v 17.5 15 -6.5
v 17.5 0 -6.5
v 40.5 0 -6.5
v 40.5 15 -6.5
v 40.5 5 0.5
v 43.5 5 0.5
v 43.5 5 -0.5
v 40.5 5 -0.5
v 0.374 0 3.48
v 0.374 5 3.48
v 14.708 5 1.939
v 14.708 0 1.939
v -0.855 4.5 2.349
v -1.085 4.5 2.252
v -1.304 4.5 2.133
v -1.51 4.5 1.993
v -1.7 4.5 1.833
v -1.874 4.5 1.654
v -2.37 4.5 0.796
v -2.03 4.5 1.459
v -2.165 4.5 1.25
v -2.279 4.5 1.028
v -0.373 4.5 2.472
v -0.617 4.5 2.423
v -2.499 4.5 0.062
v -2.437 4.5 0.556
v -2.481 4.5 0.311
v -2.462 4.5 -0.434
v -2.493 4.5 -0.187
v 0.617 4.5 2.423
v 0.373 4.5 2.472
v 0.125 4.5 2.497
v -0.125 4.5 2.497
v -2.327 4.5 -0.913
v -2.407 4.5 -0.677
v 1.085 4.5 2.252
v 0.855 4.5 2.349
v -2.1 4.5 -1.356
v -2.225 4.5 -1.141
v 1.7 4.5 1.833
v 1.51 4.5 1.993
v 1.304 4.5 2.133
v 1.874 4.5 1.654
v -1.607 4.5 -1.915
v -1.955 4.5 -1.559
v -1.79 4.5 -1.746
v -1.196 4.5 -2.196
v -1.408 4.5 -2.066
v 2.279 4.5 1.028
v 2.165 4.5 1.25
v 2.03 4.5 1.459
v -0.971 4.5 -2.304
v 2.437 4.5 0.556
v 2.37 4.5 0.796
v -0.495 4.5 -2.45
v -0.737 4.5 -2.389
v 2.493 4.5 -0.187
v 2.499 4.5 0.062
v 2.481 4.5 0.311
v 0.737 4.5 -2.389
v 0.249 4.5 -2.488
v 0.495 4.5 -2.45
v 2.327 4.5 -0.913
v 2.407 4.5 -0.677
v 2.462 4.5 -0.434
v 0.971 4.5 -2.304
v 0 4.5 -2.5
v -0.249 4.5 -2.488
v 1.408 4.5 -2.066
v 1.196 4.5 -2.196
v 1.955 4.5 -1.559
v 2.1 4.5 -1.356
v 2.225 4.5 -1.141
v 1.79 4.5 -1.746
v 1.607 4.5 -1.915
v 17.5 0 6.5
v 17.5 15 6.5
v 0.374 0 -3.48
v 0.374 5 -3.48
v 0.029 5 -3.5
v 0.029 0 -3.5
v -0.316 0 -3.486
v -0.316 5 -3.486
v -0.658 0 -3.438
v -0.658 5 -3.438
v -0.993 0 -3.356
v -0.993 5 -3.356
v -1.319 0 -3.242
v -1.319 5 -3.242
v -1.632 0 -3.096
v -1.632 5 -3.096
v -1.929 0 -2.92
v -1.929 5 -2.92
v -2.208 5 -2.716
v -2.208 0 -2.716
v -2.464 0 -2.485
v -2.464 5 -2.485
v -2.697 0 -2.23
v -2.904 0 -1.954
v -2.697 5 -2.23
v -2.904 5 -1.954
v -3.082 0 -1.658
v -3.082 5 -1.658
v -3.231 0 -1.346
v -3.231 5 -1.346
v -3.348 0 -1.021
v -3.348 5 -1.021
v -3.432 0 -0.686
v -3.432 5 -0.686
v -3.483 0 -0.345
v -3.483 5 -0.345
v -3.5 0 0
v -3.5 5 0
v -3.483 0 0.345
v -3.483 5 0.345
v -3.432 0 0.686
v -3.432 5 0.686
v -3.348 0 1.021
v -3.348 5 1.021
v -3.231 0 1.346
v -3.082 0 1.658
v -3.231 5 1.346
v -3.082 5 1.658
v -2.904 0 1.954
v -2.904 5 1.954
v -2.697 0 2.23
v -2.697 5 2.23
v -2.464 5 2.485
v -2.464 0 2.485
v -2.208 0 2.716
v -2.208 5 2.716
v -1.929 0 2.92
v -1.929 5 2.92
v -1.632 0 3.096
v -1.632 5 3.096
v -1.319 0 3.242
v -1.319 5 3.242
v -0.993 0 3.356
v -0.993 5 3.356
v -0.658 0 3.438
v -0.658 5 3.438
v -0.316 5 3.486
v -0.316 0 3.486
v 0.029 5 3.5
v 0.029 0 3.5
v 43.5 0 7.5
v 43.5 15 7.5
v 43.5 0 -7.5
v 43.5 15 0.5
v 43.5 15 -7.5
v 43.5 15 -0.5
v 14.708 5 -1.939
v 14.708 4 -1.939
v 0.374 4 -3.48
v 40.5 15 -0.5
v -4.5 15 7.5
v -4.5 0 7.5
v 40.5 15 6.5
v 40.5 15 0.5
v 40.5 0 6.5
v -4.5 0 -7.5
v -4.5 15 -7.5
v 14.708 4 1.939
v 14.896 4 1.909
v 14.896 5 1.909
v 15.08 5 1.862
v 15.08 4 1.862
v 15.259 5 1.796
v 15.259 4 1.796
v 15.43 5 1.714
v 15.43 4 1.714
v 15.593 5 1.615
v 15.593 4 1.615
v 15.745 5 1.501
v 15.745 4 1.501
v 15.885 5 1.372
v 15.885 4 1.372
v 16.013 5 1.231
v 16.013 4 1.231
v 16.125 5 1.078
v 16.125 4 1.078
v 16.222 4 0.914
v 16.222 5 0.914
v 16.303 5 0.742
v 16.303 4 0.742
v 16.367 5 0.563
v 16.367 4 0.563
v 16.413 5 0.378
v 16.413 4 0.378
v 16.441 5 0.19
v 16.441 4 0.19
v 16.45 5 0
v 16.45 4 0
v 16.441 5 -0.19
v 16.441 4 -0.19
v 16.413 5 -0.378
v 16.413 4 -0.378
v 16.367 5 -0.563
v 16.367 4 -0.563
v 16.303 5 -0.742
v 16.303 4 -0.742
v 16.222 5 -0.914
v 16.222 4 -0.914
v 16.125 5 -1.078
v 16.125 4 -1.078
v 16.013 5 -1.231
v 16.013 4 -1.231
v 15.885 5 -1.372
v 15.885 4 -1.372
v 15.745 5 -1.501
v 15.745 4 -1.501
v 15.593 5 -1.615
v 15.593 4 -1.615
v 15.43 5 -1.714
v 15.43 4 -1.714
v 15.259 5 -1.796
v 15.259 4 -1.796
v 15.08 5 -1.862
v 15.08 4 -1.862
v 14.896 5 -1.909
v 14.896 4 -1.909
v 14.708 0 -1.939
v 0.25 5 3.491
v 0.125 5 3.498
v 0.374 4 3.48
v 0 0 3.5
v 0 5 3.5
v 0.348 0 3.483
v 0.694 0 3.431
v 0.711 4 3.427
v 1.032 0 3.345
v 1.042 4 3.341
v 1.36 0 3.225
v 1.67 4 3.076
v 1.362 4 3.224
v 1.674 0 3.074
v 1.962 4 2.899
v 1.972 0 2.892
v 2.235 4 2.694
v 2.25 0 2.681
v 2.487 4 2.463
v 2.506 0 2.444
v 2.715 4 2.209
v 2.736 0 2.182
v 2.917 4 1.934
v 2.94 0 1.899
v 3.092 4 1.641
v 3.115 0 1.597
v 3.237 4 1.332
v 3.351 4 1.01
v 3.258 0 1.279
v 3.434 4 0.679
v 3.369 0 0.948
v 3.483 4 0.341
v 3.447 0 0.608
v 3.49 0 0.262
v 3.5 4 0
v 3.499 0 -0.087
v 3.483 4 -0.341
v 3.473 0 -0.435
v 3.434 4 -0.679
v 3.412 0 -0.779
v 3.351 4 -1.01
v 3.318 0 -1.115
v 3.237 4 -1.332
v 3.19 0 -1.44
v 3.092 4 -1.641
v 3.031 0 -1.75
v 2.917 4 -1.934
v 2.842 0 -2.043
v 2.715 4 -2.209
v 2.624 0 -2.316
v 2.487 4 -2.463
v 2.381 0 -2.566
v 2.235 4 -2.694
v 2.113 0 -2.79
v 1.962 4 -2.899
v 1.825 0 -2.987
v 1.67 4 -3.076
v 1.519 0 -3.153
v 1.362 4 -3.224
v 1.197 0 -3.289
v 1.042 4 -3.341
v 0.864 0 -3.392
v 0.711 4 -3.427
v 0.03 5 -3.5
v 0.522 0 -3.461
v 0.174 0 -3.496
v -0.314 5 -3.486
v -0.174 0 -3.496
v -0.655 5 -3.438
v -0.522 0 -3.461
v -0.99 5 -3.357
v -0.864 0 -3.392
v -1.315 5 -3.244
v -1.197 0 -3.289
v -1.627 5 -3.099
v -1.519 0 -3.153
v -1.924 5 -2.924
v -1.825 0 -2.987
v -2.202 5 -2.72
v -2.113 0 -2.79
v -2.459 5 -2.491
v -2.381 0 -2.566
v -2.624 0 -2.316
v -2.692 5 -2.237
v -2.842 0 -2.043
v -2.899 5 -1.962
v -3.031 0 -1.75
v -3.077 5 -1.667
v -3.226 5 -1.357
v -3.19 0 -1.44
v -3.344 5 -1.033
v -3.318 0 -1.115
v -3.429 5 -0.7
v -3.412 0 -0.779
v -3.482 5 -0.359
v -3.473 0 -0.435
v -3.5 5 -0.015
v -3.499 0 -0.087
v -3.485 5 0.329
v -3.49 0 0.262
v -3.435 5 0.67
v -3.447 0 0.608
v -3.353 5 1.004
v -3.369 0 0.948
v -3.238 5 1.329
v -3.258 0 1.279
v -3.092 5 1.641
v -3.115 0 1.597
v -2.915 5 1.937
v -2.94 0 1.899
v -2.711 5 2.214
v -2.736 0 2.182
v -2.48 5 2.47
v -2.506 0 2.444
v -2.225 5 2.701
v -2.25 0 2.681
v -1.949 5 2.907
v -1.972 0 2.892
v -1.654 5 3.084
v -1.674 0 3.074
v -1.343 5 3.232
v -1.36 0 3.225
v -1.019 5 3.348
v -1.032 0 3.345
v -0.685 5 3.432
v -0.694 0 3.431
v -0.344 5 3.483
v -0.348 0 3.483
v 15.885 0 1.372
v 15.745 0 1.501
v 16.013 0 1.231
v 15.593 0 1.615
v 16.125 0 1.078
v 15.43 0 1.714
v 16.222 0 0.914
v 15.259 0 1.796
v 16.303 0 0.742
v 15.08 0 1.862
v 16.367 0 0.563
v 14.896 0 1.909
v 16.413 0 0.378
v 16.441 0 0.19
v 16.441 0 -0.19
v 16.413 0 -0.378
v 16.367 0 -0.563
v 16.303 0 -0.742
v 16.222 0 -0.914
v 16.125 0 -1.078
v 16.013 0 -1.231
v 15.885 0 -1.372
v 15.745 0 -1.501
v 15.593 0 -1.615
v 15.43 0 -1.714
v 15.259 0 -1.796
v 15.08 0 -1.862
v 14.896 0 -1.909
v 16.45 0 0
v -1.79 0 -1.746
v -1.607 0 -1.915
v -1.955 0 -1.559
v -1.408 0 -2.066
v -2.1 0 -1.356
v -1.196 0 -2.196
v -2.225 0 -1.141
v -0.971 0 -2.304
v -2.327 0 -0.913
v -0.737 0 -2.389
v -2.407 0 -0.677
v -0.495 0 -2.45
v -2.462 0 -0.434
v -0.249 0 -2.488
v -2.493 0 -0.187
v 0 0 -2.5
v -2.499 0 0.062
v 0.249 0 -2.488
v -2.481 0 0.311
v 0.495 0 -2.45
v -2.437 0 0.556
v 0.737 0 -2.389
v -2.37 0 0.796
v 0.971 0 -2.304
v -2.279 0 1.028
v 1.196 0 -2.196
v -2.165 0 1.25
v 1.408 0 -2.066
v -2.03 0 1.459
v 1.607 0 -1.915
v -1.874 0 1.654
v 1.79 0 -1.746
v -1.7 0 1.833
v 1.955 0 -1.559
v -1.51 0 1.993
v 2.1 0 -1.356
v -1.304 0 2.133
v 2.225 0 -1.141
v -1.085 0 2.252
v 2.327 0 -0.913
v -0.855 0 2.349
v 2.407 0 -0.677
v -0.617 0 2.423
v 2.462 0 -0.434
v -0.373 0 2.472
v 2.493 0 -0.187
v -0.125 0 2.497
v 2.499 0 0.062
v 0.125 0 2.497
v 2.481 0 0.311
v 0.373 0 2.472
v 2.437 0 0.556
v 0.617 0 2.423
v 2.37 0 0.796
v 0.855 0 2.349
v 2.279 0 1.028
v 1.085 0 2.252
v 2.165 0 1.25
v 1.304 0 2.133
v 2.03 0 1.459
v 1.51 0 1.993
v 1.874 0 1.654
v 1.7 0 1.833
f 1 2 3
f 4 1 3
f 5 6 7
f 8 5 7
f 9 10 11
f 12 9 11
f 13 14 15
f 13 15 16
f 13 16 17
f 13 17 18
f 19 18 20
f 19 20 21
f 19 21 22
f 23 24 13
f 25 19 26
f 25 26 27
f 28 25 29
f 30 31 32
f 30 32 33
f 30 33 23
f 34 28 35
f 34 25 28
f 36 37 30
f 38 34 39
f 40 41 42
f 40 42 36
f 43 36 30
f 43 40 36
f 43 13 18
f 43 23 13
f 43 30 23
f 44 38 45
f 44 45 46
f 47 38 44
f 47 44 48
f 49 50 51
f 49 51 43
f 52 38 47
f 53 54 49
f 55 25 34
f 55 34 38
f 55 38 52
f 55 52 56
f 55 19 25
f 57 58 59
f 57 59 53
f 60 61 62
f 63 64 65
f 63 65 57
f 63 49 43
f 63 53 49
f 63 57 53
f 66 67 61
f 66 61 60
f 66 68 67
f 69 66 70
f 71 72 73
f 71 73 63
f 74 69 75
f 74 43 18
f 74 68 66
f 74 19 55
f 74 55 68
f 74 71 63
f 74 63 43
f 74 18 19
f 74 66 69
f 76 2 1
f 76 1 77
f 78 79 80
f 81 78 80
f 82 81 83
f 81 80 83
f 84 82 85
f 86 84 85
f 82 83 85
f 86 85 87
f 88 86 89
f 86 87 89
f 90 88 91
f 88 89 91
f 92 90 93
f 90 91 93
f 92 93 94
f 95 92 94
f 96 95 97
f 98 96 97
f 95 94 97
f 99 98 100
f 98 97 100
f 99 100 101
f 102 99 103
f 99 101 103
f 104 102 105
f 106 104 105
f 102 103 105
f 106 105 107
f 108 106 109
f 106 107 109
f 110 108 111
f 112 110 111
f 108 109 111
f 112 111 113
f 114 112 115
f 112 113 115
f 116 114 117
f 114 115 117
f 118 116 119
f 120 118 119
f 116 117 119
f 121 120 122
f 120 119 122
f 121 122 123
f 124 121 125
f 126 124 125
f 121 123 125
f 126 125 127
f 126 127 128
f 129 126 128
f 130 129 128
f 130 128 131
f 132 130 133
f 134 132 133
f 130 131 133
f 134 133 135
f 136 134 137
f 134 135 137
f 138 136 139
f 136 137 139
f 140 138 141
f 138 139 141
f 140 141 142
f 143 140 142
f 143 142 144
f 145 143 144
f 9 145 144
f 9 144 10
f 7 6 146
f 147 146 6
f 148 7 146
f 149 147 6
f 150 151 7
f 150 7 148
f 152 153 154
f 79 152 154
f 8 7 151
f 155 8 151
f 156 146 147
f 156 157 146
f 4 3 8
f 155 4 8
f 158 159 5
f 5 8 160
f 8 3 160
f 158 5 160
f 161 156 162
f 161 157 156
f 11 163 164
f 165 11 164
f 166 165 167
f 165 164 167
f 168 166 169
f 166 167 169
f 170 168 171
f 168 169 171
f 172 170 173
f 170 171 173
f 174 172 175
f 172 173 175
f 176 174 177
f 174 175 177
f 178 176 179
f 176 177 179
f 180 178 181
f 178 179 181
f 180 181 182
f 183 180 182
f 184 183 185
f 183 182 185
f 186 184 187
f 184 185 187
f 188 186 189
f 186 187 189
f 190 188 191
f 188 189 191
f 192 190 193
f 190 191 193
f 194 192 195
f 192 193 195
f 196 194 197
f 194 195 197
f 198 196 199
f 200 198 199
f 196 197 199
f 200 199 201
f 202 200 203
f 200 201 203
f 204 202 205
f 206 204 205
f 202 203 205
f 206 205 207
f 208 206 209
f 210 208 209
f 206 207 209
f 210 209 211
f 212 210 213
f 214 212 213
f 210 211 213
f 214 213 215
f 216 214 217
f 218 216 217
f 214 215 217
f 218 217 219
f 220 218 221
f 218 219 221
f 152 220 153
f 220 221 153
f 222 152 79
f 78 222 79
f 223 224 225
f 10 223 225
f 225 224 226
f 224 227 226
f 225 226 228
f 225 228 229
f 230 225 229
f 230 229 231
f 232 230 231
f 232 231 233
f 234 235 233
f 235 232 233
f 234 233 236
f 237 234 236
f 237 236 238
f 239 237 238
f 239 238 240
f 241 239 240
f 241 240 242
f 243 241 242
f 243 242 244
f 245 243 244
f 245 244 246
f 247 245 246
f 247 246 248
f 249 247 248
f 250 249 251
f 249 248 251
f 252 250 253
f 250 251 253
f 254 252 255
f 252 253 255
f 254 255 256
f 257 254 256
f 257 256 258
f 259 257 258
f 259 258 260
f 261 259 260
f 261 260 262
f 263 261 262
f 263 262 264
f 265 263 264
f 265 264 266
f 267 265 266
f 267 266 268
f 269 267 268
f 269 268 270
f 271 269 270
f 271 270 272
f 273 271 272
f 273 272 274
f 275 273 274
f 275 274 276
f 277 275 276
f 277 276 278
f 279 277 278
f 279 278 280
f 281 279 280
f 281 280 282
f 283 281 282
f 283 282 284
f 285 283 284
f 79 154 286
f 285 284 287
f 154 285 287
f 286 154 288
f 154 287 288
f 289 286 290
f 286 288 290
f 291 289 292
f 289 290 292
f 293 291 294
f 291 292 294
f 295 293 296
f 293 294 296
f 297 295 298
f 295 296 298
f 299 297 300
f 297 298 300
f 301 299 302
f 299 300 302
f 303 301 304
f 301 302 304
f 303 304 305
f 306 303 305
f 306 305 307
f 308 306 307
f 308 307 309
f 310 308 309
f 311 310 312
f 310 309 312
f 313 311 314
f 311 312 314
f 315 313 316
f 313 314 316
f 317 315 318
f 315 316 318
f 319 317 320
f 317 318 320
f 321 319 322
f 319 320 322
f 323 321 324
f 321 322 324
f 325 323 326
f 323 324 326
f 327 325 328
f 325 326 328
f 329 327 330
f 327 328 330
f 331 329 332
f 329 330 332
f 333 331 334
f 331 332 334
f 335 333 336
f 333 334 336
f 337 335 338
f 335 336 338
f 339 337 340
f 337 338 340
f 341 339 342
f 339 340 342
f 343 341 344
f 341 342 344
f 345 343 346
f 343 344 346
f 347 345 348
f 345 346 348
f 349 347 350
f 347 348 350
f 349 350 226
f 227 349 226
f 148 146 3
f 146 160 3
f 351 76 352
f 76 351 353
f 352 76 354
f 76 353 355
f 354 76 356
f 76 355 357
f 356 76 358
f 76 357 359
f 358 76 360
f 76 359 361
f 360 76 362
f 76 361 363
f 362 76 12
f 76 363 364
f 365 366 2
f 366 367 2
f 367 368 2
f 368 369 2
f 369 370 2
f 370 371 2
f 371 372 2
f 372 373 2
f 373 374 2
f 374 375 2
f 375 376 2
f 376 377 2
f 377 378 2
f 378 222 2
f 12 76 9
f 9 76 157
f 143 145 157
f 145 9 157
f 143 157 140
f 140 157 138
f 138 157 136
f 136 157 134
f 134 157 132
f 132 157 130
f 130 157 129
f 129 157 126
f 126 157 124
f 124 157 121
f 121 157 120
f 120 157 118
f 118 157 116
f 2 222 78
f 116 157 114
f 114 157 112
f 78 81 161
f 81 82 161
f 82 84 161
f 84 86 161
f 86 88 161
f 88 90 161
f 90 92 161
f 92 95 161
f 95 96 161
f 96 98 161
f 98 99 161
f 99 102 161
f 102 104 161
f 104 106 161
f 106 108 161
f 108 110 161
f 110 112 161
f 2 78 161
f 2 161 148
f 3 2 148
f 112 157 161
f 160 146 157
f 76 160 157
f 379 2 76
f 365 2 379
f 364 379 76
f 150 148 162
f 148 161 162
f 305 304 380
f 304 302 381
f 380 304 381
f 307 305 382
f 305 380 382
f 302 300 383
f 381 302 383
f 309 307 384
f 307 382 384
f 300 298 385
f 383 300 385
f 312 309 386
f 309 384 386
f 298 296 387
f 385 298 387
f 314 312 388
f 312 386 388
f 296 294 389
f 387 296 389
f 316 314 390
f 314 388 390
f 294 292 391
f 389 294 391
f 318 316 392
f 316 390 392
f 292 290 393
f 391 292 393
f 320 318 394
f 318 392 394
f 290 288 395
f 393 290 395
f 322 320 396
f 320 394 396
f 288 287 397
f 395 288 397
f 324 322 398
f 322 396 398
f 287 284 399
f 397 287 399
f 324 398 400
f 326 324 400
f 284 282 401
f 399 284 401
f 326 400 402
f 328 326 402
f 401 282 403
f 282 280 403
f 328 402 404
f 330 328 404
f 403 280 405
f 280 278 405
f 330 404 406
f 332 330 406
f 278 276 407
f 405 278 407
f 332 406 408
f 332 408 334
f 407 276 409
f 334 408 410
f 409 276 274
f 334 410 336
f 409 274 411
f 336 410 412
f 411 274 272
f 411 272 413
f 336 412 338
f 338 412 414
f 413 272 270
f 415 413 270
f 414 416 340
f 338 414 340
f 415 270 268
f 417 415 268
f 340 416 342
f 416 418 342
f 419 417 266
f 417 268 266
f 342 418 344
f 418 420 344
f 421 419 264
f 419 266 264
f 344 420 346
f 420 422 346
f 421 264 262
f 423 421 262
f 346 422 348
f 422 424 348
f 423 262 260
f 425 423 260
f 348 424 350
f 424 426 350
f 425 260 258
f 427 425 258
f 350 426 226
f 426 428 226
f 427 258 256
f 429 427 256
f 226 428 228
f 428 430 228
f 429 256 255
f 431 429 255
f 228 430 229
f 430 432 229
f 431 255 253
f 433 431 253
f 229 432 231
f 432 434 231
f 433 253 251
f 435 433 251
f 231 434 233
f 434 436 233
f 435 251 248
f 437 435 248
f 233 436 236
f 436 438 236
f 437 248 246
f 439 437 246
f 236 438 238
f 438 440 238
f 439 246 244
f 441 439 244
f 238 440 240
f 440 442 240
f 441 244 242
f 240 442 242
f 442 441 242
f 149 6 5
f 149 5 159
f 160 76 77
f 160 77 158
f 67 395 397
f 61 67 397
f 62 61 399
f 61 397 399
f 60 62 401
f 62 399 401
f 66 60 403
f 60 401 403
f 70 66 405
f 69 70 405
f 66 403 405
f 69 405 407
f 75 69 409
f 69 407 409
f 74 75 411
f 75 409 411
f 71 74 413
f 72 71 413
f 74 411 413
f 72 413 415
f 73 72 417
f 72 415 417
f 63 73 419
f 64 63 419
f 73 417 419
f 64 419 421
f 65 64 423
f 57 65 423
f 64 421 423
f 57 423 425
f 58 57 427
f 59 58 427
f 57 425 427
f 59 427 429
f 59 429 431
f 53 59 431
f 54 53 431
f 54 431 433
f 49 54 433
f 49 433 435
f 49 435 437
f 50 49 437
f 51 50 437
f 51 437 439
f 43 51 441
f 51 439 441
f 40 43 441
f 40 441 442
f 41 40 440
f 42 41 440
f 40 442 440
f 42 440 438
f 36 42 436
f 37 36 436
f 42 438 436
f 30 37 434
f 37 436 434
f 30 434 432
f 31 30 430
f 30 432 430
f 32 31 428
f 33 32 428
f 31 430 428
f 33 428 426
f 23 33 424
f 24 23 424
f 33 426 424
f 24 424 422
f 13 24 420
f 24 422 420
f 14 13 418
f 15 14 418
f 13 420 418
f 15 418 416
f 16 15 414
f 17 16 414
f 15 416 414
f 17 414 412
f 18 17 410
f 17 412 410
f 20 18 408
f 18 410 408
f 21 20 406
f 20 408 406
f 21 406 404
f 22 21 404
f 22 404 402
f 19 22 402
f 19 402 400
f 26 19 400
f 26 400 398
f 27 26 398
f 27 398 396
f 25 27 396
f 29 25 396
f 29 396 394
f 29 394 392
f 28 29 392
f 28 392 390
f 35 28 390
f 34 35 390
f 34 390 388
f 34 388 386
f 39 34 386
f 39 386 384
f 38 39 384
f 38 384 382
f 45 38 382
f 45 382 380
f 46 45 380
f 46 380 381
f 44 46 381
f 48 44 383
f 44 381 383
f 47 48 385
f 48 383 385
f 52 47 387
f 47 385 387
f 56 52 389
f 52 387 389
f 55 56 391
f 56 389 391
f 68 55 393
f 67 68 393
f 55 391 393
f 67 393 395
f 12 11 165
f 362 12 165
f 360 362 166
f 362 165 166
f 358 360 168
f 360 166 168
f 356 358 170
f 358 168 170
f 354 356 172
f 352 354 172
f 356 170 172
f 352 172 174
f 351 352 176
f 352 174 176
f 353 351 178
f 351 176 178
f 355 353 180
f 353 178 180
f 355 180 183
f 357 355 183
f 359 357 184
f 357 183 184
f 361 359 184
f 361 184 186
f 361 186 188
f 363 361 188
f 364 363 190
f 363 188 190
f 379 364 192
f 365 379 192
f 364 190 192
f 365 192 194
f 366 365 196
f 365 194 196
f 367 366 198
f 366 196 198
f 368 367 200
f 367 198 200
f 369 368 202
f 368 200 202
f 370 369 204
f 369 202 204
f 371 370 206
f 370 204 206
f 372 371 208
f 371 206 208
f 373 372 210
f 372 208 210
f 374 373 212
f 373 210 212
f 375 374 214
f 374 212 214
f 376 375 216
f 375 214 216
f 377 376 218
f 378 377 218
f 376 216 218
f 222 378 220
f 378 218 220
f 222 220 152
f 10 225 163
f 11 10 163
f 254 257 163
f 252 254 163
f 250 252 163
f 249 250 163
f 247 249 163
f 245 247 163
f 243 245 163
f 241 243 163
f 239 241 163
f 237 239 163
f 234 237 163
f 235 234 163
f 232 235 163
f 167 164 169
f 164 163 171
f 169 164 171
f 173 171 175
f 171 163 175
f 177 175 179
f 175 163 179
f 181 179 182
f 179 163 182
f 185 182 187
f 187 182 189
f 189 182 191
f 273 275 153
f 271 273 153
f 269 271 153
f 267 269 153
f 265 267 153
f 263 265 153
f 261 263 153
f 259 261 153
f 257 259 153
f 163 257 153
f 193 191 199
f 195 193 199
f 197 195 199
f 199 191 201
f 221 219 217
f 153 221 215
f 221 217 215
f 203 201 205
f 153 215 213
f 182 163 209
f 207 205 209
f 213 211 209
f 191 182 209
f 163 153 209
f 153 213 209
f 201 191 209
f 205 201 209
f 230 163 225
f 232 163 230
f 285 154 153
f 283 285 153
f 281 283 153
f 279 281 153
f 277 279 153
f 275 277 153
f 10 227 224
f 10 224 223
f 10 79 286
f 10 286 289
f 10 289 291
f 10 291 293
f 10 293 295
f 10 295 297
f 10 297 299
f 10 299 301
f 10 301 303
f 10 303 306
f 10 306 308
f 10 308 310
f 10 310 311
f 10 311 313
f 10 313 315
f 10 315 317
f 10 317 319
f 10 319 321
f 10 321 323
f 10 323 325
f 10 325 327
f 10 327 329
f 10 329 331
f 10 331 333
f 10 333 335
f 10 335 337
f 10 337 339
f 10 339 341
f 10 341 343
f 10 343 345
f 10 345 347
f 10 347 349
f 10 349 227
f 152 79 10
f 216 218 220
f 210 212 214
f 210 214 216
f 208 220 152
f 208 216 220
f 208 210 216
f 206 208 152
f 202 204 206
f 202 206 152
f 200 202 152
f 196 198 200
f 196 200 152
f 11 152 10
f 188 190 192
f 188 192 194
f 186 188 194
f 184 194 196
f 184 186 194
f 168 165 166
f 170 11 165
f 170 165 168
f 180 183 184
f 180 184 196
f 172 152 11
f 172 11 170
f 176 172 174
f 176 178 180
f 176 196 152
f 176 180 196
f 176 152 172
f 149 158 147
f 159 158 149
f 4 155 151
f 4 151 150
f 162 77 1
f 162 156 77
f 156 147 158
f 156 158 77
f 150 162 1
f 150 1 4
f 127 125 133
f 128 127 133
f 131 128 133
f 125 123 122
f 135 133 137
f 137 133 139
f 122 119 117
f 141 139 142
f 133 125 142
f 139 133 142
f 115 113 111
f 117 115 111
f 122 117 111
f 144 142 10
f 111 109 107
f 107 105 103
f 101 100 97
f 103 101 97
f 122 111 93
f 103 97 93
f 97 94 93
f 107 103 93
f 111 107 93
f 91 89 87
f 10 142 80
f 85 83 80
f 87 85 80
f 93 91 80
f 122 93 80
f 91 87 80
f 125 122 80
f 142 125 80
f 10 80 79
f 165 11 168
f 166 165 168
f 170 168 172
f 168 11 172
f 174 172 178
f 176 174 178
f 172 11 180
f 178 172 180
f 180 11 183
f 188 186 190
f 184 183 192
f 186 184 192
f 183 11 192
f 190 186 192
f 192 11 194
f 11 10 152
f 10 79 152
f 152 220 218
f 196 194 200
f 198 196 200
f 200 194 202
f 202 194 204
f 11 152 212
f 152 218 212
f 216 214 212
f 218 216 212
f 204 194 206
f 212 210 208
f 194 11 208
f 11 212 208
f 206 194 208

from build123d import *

# Parameters (mm, degrees)
SKETCH1_R               = 3.5
BOSS_EXTRUDE1_DEPTH     = 5
SKETCH2_R               = 2.5
CUT_EXTRUDE1_DEPTH      = 4.5
BOSS_EXTRUDE2_START     = -1
BOSS_EXTRUDE2_DEPTH     = 1
SKETCH4_W               = 22
SKETCH4_H               = 15
BOSS_EXTRUDE3_DEPTH     = 5
SKETCH5_W               = 22
SKETCH5_H               = 15
BOSS_EXTRUDE4_DEPTH     = 10
SKETCH7_W               = 15
SKETCH7_H               = 15
BOSS_EXTRUDE5_DEPTH     = 26
SKETCH8_W               = 23
SKETCH8_H               = 13
CUT_EXTRUDE2_DEPTH      = 24
SKETCH9_W               = 1
SKETCH9_H               = 10
CUT_EXTRUDE_THIN1_DEPTH = 3


with BuildPart() as part:
    # Sketch1 → Boss-Extrude1 (new body)
    with BuildSketch(Plane(origin=(0, 0, 0), x_dir=(1, 0, 0), z_dir=(0, 1, 0))):
        with Locations(Location((0, 0, 0), (0, 0, 270))):
            Circle(SKETCH1_R)
    extrude(amount=BOSS_EXTRUDE1_DEPTH)

    # Sketch2 → Cut-Extrude1 (cut)
    with BuildSketch(Plane.XZ):
        with Locations(Location((0, 0, 0), (0, 0, 270))):
            Circle(SKETCH2_R)
    extrude(amount=-CUT_EXTRUDE1_DEPTH, mode=Mode.SUBTRACT)

    # Sketch3 → Boss-Extrude2 (add)
    with BuildSketch(Plane(origin=(0, 5, 0), x_dir=(1, 0, 0), z_dir=(0, 1, 0)).offset(BOSS_EXTRUDE2_START)):
        with BuildLine():
            Line((0.374137931, -3.479945518), (14.708448276, -1.938826789))
            ThreePointArc((14.708448276, -1.938826789), (16.45, 0), (14.708448276, 1.938826789))
            Line((14.708448276, 1.938826789), (0.374137931, 3.479945518))
            ThreePointArc((0.374137931, 3.479945518), (3.5, 0), (0.374137931, -3.479945518))
        make_face()
    extrude(amount=BOSS_EXTRUDE2_DEPTH)


with BuildPart() as body_2:
    # Sketch4 → Boss-Extrude3 (new body)
    with BuildSketch(Plane(origin=(0, 5, 0), x_dir=(1, 0, 0), z_dir=(0, 1, 0))):
        with Locations((6.5, 0)):
            Rectangle(SKETCH4_W, SKETCH4_H)
        with BuildLine():
            Line((0.374137931, -3.479945518), (14.708448276, -1.938826789))
            ThreePointArc((14.708448276, -1.938826789), (16.45, 0), (14.708448276, 1.938826789))
            Line((14.708448276, 1.938826789), (0.374137931, 3.479945518))
            ThreePointArc((0.374137931, 3.479945518), (-3.5, 0), (0.374137931, -3.479945518))
        make_face(mode=Mode.SUBTRACT)
    extrude(amount=-BOSS_EXTRUDE3_DEPTH)

    # Sketch5 → Boss-Extrude4 (add)
    with BuildSketch(Plane(origin=(0, 5, 0), x_dir=(1, 0, 0), z_dir=(0, 1, 0))):
        with Locations((6.5, 0)):
            Rectangle(SKETCH5_W, SKETCH5_H)
    extrude(amount=BOSS_EXTRUDE4_DEPTH)

    # Sketch7 → Boss-Extrude5 (add)
    with BuildSketch(Plane(origin=(17.5, 0, 0), x_dir=(0, 0, -1), z_dir=(1, 0, 0))):
        with Locations((0, 7.5)):
            Rectangle(SKETCH7_W, SKETCH7_H)
    extrude(amount=BOSS_EXTRUDE5_DEPTH)

    # Sketch8 → Cut-Extrude2 (cut)
    with BuildSketch(Plane.XZ):
        with Locations((29, 0)):
            Rectangle(SKETCH8_W, SKETCH8_H)
    extrude(amount=-CUT_EXTRUDE2_DEPTH, mode=Mode.SUBTRACT)

    # Sketch9 → Cut-Extrude-Thin1 (cut)
    with BuildSketch(Plane(origin=(43.5, 0, 0), x_dir=(0, 0, -1), z_dir=(1, 0, 0))):
        with Locations((0, 10)):
            Rectangle(SKETCH9_W, SKETCH9_H)
    extrude(amount=-CUT_EXTRUDE_THIN1_DEPTH, mode=Mode.SUBTRACT)


solid = Compound([part.part, body_2.part])
